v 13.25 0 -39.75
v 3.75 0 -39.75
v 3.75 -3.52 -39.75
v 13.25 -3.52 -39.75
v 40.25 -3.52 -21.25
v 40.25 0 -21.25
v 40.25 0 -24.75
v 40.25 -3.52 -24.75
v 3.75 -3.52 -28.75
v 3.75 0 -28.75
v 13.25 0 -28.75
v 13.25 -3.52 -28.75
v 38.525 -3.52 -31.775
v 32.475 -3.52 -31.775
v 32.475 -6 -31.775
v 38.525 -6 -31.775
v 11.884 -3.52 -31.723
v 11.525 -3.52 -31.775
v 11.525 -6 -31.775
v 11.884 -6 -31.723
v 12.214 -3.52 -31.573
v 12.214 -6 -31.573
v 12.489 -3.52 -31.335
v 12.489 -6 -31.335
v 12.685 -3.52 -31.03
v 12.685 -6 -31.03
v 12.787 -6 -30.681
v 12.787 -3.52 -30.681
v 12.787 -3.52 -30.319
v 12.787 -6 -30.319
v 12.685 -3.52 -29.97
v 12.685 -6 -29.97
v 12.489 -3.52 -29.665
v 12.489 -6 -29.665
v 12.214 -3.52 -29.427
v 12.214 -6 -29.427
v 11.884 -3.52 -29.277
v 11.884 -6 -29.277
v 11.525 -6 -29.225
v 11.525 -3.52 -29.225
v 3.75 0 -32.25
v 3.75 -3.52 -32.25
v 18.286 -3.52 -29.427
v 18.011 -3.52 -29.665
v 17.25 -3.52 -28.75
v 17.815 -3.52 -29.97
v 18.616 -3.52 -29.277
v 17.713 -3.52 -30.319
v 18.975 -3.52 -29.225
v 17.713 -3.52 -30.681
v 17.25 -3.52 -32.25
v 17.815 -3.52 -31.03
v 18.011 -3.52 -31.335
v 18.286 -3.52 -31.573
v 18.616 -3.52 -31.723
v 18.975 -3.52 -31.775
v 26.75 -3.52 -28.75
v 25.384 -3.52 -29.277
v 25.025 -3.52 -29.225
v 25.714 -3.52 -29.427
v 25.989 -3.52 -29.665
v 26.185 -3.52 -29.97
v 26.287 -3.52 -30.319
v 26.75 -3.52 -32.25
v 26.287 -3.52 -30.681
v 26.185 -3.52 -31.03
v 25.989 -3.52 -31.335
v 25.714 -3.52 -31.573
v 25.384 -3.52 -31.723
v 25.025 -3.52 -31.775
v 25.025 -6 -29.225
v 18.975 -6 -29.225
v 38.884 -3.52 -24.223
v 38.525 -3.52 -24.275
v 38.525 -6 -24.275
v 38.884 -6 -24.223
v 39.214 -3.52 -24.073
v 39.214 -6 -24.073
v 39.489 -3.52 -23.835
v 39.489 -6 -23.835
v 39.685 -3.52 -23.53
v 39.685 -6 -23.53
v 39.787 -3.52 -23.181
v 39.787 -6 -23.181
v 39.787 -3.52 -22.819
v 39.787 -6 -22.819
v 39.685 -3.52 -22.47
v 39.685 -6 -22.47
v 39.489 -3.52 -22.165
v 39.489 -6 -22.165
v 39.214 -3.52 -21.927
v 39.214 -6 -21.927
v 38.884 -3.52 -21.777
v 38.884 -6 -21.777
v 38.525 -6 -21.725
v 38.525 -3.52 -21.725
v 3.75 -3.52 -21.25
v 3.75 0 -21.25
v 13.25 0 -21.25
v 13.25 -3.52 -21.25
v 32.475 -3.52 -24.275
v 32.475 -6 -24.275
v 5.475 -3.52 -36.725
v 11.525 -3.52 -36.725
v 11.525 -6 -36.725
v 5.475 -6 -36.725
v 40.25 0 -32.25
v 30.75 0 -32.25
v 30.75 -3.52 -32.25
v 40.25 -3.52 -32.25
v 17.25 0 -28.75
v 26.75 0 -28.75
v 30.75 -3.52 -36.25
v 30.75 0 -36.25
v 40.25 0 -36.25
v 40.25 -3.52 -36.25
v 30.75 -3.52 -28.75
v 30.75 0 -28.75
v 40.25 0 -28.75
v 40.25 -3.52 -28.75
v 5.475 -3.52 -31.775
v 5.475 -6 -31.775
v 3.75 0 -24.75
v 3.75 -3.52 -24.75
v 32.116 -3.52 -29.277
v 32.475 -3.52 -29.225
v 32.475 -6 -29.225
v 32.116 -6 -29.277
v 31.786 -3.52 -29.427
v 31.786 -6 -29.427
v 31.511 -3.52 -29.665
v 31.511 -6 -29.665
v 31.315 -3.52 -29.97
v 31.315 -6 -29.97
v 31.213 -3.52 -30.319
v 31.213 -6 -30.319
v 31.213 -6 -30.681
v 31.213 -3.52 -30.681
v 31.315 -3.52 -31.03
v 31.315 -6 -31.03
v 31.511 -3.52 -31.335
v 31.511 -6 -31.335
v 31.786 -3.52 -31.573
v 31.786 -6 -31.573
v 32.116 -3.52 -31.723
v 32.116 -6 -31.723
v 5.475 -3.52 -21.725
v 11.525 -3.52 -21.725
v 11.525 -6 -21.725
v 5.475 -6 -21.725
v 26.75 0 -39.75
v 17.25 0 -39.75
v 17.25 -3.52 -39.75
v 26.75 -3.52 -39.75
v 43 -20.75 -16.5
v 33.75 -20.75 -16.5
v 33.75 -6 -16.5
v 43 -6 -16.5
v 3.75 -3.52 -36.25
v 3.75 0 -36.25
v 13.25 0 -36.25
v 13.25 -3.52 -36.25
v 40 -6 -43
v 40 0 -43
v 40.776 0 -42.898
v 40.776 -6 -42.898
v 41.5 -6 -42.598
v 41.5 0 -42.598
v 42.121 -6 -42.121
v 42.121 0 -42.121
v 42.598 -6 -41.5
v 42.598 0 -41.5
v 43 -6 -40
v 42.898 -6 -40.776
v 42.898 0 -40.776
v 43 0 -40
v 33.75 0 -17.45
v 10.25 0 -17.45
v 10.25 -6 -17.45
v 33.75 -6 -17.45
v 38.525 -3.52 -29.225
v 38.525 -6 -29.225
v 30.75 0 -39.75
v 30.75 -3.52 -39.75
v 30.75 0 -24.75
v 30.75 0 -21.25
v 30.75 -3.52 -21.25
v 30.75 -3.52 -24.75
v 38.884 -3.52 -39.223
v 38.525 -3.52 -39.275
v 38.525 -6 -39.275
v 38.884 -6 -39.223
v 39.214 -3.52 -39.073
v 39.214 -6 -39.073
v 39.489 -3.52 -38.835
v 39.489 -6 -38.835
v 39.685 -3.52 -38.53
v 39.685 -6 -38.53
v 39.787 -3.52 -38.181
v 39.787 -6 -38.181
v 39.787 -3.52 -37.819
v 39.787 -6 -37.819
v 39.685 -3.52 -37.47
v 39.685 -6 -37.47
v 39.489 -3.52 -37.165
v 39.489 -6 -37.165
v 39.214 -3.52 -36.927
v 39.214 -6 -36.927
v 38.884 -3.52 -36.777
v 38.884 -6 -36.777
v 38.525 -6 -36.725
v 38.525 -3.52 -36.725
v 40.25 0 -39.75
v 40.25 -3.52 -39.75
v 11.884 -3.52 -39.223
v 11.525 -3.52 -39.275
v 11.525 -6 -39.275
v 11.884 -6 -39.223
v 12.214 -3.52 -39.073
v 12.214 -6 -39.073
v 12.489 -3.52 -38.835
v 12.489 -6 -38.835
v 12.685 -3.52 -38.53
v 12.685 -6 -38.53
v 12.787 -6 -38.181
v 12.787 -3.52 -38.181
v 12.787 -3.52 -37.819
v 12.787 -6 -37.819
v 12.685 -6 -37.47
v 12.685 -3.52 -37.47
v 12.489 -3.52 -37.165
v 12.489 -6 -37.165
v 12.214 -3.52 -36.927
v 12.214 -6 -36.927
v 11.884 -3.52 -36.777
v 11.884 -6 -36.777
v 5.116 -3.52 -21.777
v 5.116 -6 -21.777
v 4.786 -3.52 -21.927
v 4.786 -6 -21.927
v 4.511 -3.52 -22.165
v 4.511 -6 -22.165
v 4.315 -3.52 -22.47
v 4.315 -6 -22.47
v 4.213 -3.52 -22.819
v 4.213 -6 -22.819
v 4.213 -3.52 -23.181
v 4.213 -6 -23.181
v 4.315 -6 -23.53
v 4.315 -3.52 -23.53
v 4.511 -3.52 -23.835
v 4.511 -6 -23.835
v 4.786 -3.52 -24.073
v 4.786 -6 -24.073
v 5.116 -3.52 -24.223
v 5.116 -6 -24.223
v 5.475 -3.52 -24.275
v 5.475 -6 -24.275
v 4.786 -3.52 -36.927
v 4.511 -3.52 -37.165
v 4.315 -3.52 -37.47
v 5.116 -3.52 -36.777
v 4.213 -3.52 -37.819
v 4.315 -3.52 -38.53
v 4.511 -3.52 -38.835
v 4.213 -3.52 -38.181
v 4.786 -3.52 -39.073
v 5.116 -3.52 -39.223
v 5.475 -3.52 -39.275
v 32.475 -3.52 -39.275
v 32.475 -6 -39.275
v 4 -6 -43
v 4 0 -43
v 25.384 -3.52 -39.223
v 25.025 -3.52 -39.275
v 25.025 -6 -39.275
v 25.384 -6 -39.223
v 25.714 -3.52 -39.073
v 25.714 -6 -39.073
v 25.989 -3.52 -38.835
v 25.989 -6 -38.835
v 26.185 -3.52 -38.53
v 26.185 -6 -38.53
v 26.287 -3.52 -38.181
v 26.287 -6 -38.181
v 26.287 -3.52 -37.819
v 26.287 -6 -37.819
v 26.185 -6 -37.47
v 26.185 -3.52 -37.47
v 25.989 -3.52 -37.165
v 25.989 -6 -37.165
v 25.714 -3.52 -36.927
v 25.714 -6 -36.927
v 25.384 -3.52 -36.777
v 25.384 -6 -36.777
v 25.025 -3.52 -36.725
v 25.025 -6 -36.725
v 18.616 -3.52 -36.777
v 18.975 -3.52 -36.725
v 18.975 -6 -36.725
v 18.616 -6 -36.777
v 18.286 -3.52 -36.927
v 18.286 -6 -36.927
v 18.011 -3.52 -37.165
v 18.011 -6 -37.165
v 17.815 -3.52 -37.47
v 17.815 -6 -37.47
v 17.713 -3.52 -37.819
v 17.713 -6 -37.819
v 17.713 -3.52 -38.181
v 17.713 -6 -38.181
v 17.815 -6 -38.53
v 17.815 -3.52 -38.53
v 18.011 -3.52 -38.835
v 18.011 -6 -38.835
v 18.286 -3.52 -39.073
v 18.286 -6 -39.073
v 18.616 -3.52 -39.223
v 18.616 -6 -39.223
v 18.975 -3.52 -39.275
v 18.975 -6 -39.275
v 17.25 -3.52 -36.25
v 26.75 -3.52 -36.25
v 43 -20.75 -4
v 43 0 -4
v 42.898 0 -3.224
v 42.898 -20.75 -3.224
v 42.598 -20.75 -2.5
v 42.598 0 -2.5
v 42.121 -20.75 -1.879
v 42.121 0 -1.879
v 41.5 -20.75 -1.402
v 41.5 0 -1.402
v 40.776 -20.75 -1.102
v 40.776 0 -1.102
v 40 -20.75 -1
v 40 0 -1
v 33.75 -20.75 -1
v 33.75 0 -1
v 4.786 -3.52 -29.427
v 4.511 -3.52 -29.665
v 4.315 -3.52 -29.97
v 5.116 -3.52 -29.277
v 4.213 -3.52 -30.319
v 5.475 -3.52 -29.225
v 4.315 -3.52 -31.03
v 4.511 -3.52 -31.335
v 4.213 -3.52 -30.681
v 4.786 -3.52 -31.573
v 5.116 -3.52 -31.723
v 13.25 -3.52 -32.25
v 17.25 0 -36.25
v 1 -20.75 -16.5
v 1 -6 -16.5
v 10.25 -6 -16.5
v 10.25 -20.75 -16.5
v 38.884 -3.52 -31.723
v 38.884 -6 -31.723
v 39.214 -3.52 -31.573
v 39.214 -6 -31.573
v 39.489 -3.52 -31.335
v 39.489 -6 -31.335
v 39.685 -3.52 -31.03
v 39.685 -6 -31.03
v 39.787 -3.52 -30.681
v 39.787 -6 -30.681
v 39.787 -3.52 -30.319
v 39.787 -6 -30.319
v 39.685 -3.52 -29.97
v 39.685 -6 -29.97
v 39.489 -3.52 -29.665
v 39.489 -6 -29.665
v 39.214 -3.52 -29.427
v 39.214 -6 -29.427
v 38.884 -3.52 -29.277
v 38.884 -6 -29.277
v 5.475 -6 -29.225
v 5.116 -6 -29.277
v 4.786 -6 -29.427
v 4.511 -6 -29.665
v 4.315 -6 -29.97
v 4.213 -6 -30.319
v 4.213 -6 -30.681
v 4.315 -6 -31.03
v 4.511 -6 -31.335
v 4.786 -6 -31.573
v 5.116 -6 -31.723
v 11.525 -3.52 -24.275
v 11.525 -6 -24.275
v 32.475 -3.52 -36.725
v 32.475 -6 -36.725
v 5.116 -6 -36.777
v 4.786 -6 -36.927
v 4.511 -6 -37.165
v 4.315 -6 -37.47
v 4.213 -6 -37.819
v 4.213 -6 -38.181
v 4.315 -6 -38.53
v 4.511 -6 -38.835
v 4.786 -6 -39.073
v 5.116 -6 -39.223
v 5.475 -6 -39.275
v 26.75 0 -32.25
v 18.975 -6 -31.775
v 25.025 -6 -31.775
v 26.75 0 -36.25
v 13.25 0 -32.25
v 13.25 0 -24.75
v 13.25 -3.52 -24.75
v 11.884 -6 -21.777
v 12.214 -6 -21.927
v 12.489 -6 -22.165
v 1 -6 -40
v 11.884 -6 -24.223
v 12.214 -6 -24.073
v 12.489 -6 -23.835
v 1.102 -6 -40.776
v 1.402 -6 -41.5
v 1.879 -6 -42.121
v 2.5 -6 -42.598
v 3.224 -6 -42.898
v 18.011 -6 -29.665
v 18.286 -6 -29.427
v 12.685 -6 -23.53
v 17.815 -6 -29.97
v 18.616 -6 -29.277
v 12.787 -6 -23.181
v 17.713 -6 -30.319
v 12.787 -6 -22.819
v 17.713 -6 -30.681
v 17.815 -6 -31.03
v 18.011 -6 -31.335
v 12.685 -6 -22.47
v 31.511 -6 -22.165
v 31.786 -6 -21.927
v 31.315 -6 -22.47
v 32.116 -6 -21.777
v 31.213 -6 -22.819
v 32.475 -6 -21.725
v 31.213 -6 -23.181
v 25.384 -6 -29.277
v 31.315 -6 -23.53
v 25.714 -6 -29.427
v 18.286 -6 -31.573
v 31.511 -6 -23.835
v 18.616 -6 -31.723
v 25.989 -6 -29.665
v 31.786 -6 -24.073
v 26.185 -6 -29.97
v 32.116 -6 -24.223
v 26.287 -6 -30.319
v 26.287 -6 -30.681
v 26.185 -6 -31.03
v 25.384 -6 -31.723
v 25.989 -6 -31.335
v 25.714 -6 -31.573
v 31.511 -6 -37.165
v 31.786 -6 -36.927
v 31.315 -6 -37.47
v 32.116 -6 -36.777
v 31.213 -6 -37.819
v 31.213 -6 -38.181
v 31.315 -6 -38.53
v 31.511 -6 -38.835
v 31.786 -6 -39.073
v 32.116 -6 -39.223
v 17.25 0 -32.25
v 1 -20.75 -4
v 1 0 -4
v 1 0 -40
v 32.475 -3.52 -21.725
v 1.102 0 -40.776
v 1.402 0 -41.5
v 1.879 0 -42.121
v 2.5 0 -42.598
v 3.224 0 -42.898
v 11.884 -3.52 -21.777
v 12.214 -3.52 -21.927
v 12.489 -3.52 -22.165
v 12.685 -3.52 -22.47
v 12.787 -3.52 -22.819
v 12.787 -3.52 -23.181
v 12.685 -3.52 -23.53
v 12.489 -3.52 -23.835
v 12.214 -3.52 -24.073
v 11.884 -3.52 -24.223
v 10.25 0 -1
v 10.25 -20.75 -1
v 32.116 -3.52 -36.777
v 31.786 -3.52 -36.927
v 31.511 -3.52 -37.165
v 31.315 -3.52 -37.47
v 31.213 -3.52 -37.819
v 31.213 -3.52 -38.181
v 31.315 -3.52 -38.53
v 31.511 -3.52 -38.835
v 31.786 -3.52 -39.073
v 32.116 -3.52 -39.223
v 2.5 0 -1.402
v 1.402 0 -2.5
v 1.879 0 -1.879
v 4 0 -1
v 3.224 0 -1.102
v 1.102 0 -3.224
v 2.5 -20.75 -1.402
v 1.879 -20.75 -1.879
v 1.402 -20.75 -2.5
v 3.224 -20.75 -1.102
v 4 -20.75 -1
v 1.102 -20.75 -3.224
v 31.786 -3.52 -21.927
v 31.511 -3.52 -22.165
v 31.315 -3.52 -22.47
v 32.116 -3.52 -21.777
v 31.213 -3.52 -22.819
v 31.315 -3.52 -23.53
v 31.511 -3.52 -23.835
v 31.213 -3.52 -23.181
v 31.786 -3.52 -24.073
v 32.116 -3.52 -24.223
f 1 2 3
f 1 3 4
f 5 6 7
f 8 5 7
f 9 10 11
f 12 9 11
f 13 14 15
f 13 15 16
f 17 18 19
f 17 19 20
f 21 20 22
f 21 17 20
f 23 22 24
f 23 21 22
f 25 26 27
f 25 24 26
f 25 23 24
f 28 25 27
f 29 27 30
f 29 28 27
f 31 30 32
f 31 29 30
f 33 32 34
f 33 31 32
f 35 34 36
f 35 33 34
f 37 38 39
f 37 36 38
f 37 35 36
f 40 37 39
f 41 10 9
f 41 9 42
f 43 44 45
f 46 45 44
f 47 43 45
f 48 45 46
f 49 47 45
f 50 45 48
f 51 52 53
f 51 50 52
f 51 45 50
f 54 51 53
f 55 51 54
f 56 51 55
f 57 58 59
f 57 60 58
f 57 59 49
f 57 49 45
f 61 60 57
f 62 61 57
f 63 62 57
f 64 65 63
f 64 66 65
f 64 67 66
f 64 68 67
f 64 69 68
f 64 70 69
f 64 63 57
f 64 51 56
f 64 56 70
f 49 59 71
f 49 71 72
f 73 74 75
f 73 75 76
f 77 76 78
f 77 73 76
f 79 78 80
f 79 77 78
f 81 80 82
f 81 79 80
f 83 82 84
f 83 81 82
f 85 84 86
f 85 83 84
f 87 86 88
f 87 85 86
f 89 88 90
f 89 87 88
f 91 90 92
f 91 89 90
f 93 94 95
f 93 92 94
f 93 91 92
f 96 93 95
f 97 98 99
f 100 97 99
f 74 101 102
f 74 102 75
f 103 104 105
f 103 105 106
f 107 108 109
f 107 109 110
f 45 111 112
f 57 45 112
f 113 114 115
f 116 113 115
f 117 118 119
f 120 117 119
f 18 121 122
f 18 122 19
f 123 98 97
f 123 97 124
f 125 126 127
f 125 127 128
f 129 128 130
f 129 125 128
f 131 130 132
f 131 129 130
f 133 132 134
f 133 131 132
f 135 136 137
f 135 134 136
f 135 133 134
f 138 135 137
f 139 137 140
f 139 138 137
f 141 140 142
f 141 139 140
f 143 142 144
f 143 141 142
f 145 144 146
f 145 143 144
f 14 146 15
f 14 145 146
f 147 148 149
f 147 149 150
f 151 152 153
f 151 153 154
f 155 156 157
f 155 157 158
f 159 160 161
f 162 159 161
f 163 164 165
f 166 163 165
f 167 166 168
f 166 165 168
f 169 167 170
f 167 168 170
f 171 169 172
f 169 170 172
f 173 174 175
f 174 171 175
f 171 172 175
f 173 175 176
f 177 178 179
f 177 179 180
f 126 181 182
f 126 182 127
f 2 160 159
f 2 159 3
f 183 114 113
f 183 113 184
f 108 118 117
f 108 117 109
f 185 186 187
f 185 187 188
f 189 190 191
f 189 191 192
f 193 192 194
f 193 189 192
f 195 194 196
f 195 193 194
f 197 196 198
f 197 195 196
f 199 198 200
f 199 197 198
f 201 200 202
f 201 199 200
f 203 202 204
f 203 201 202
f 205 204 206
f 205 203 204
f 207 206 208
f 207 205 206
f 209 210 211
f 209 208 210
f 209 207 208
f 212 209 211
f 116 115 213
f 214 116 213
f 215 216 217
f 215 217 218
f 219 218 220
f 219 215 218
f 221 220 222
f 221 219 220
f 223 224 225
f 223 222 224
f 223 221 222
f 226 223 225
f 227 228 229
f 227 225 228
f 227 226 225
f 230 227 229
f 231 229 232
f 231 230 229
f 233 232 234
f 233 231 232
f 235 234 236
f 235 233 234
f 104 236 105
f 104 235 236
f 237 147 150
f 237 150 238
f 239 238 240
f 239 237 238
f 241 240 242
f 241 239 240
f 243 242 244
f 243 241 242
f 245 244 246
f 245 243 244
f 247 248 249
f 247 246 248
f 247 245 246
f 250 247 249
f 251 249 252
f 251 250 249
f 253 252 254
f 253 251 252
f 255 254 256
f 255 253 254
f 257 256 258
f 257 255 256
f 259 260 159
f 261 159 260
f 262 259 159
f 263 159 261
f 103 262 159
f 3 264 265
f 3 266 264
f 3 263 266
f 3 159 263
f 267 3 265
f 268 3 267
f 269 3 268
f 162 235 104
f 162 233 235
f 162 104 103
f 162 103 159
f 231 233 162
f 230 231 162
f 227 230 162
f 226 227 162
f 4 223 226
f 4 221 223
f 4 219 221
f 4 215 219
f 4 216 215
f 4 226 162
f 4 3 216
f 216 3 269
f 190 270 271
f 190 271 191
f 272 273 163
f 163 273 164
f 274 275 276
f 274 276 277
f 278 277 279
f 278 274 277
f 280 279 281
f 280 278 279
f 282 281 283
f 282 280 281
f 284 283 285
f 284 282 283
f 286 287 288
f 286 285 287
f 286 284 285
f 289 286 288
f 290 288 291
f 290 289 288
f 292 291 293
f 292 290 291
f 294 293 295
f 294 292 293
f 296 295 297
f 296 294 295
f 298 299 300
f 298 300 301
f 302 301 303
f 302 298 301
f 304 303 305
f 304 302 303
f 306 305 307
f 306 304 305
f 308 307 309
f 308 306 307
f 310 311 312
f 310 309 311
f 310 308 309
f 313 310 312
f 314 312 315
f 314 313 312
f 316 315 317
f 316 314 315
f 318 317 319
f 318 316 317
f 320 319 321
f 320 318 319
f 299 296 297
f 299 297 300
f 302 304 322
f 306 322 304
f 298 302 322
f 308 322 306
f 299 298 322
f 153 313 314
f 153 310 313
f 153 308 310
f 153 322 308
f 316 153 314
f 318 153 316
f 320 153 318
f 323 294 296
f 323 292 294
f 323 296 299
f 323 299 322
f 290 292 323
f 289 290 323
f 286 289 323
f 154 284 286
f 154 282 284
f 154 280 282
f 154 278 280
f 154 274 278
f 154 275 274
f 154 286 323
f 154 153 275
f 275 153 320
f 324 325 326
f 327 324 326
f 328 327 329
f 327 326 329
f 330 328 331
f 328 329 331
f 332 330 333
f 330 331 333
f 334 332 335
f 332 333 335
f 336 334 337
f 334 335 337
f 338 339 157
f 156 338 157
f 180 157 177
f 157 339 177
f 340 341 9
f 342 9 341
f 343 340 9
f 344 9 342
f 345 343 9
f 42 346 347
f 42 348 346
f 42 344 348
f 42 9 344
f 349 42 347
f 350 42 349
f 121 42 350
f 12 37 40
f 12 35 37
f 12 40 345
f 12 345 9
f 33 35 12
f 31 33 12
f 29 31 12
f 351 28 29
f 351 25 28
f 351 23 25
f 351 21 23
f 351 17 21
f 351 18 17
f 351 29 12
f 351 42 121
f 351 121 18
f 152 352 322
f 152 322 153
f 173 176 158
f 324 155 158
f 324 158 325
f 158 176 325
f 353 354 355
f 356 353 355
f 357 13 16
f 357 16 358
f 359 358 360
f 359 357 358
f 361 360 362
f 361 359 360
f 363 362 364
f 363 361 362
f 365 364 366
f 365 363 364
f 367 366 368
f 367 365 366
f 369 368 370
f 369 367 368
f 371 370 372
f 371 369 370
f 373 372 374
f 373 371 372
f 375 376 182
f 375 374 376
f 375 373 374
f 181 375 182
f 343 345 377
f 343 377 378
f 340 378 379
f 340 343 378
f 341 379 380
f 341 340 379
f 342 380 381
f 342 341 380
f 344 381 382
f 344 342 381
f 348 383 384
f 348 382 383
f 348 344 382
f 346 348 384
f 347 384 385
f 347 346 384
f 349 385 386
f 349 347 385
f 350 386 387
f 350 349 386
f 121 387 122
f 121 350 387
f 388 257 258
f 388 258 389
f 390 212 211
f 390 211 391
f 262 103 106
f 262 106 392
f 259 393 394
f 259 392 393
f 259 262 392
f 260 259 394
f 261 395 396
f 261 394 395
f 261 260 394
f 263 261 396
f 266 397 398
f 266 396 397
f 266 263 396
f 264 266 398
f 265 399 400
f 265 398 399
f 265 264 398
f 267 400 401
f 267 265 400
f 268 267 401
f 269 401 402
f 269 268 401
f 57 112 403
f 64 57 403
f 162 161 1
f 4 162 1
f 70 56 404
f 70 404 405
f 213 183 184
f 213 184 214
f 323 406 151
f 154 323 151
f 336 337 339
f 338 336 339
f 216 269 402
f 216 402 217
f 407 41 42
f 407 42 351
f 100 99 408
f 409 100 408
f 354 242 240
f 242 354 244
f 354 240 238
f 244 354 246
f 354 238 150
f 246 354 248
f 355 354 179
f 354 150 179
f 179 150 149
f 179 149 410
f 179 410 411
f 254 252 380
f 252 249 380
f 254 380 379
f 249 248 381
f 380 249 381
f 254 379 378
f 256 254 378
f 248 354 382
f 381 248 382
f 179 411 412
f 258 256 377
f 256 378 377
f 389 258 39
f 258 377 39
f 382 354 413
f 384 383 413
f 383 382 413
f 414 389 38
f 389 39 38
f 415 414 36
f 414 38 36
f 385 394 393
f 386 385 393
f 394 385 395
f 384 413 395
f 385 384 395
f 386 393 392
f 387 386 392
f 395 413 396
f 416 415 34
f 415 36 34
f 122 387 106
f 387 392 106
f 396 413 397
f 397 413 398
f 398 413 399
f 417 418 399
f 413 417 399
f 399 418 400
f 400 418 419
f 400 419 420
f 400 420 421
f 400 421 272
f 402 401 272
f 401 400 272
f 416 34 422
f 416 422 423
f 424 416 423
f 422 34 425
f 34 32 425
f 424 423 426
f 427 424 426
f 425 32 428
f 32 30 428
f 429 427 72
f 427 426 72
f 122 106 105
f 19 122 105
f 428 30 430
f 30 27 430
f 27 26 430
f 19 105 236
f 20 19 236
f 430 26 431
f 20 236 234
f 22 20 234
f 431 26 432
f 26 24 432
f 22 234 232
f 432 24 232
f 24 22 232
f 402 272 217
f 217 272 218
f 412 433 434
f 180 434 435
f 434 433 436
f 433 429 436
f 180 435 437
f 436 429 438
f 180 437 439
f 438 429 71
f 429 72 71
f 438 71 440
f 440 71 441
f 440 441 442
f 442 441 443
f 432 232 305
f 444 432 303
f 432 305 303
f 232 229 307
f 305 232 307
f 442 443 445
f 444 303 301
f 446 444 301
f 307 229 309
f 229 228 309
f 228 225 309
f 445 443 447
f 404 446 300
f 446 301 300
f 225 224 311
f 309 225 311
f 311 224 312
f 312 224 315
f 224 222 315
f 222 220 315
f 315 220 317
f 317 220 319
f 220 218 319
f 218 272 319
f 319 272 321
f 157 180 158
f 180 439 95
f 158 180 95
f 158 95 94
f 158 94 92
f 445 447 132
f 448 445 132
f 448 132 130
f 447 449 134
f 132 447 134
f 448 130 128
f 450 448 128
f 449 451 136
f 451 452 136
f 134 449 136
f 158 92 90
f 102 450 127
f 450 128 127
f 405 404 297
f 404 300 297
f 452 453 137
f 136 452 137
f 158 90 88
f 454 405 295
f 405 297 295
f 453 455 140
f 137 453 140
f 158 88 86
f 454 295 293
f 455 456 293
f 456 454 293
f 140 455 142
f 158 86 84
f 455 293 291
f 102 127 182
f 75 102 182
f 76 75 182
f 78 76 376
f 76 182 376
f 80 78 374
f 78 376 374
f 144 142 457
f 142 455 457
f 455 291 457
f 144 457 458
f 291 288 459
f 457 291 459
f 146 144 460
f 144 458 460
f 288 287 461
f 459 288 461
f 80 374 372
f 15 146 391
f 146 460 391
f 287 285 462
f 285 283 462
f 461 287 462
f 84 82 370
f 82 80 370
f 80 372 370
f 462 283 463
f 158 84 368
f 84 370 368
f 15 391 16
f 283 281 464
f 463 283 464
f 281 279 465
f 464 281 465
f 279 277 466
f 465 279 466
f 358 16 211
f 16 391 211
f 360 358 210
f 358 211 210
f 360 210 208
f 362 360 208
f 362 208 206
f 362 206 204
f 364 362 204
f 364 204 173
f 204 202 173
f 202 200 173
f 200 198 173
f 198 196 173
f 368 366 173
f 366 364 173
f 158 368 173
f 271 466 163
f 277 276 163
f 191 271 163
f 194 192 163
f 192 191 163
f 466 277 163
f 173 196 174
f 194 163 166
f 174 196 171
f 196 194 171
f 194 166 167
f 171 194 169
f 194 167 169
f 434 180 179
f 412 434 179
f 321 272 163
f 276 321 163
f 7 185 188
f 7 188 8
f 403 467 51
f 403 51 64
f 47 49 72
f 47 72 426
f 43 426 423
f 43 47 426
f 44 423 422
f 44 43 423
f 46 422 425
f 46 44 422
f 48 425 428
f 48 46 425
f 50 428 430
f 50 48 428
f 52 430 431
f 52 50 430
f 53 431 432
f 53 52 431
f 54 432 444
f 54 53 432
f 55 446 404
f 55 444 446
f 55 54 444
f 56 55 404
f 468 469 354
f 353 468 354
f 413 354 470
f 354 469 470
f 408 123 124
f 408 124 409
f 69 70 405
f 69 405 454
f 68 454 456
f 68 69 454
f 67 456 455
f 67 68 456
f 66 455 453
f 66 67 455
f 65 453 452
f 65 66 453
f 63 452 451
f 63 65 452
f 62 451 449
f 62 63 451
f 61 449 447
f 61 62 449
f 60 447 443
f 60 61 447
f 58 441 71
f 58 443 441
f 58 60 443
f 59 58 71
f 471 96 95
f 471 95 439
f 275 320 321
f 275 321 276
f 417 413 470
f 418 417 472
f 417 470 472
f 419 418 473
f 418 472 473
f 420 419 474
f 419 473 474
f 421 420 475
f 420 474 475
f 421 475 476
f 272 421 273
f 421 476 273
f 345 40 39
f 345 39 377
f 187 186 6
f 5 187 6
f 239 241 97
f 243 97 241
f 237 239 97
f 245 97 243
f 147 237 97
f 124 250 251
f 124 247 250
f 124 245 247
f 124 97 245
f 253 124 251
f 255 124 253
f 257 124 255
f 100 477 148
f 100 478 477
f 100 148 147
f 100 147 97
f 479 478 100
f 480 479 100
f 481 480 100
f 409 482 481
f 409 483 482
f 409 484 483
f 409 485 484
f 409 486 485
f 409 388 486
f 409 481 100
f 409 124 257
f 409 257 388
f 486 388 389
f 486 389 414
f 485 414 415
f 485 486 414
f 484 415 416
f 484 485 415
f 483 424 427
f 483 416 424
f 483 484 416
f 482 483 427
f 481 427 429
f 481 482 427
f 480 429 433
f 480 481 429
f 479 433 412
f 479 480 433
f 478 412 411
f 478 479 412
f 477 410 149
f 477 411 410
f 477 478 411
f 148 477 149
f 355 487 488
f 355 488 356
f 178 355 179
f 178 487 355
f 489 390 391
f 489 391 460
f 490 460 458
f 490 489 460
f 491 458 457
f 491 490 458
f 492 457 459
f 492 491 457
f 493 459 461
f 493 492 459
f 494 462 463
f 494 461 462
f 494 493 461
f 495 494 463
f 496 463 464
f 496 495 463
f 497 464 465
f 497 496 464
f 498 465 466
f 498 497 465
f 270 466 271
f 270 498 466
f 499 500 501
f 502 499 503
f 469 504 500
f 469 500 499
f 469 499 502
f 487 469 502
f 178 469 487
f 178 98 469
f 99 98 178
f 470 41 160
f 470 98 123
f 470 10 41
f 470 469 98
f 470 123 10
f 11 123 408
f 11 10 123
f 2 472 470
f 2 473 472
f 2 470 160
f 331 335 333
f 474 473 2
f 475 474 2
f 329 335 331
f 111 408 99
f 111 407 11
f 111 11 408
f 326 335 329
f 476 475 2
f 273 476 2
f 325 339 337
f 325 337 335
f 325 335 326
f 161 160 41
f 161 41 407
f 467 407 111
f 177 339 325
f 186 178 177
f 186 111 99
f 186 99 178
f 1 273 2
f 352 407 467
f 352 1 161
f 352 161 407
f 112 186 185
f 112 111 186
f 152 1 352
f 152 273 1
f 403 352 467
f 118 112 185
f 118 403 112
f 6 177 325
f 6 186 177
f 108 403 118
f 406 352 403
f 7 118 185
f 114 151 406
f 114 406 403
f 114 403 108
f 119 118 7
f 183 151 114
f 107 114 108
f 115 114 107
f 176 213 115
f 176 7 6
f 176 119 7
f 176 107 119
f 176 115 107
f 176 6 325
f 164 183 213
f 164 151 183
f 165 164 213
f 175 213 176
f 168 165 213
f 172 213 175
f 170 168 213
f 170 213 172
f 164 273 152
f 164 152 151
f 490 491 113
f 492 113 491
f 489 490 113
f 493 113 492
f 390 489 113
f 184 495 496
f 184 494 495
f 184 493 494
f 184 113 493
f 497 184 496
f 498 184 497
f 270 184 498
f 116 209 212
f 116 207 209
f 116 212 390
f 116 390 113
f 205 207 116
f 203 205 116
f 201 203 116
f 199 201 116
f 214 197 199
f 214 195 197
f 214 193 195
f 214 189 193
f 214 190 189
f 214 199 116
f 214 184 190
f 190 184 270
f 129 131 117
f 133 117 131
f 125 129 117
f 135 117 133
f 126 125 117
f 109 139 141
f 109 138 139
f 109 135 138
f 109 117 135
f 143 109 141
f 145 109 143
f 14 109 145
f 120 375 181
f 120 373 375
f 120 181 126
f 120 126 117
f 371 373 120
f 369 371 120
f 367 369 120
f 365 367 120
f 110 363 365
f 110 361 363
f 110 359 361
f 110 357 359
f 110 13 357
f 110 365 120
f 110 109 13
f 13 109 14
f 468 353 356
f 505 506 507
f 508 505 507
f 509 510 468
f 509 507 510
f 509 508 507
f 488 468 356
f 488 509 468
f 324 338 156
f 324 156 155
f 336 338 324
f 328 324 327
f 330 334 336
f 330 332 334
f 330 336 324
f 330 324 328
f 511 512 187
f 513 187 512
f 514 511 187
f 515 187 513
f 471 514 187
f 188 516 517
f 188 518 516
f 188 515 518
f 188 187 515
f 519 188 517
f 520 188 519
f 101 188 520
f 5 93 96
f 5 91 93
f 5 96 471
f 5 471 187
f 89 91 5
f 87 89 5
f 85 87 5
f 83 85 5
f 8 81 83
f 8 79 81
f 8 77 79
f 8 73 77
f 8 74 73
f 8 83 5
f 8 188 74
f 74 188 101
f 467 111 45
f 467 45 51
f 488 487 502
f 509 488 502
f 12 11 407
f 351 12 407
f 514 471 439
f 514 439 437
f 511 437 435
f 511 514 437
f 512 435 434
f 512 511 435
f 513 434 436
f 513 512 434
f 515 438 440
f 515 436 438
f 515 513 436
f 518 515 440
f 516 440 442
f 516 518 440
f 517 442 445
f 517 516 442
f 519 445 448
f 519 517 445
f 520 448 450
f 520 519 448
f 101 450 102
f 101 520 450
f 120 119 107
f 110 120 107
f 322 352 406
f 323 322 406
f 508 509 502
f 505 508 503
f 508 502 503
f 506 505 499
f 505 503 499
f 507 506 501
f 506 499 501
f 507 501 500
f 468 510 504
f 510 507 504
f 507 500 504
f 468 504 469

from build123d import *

# Parameters (mm, degrees)
SKETCH1_W            = 44
SKETCH1_H            = 44
BOSS_EXTRUDE1_DEPTH  = 6
CUT_EXTRUDE1_DEPTH   = 7
SKETCH4_W            = 44
SKETCH4_H            = 16.5
BOSS_EXTRUDE2_DEPTH  = 14.75
SKETCH5_W            = 23.5
SKETCH5_H            = 17.45
CUT_EXTRUDE2_DEPTH   = 21.75
FILLET1_R            = 3
SKETCH6_W            = 9.5
SKETCH6_H            = 3.5
CUT_EXTRUDE3_DEPTH   = 3.52
LPATTERN1_COUNT      = 3
LPATTERN1_PITCH      = 13.5
LPATTERN1_COUNT_DIR2 = 3
LPATTERN1_PITCH_DIR2 = 7.5
CUT_EXTRUDE5_REACH   = 22.75


with BuildPart() as part:
    # Sketch1 → Boss-Extrude1 (new body)
    with BuildSketch(Plane(origin=(0, 0, 0), x_dir=(1, 0, 0), z_dir=(0, 1, 0))):
        with Locations((22, 22)):
            Rectangle(SKETCH1_W, SKETCH1_H)
    extrude(amount=-BOSS_EXTRUDE1_DEPTH)

    # Sketch2 → Cut-Extrude1 (cut, through all)
    with BuildSketch(Plane(origin=(0, 0, 0), x_dir=(1, 0, 0), z_dir=(0, 1, 0))):
        with BuildLine():
            Line((5.475, 39.275), (11.525, 39.275))
            ThreePointArc((11.525, 39.275), (12.8, 38), (11.525, 36.725))
            Line((11.525, 36.725), (5.475, 36.725))
            ThreePointArc((5.475, 36.725), (4.2, 38), (5.475, 39.275))
        make_face()
        with BuildLine():
            Line((18.975, 39.275), (25.025, 39.275))
            ThreePointArc((25.025, 39.275), (26.3, 38), (25.025, 36.725))
            Line((25.025, 36.725), (18.975, 36.725))
            ThreePointArc((18.975, 36.725), (17.7, 38), (18.975, 39.275))
        make_face()
        with BuildLine():
            Line((32.475, 39.275), (38.525, 39.275))
            ThreePointArc((38.525, 39.275), (39.8, 38), (38.525, 36.725))
            Line((38.525, 36.725), (32.475, 36.725))
            ThreePointArc((32.475, 36.725), (31.2, 38), (32.475, 39.275))
        make_face()
        with BuildLine():
            Line((18.975, 31.775), (25.025, 31.775))
            ThreePointArc((25.025, 31.775), (26.3, 30.5), (25.025, 29.225))
            Line((25.025, 29.225), (18.975, 29.225))
            ThreePointArc((18.975, 29.225), (17.7, 30.5), (18.975, 31.775))
        make_face()
        with BuildLine():
            Line((32.475, 31.775), (38.525, 31.775))
            ThreePointArc((38.525, 31.775), (39.8, 30.5), (38.525, 29.225))
            Line((38.525, 29.225), (32.475, 29.225))
            ThreePointArc((32.475, 29.225), (31.2, 30.5), (32.475, 31.775))
        make_face()
        with BuildLine():
            Line((32.475, 24.275), (38.525, 24.275))
            ThreePointArc((38.525, 24.275), (39.8, 23), (38.525, 21.725))
            Line((38.525, 21.725), (32.475, 21.725))
            ThreePointArc((32.475, 21.725), (31.2, 23), (32.475, 24.275))
        make_face()
        with BuildLine():
            Line((5.475, 31.775), (11.525, 31.775))
            ThreePointArc((11.525, 31.775), (12.8, 30.5), (11.525, 29.225))
            Line((11.525, 29.225), (5.475, 29.225))
            ThreePointArc((5.475, 29.225), (4.2, 30.5), (5.475, 31.775))
        make_face()
        with BuildLine():
            Line((5.475, 24.275), (11.525, 24.275))
            ThreePointArc((11.525, 24.275), (12.8, 23), (11.525, 21.725))
            Line((11.525, 21.725), (5.475, 21.725))
            ThreePointArc((5.475, 21.725), (4.2, 23), (5.475, 24.275))
        make_face()
    extrude(amount=-CUT_EXTRUDE1_DEPTH, mode=Mode.SUBTRACT)

    # Sketch4 → Boss-Extrude2 (add)
    with BuildSketch(Plane.XZ.offset(6)):
        with Locations((22, -8.25)):
            Rectangle(SKETCH4_W, SKETCH4_H)
    extrude(amount=BOSS_EXTRUDE2_DEPTH)

    # Sketch5 → Cut-Extrude2 (cut, through all)
    with BuildSketch(Plane(origin=(0, 0, 0), x_dir=(1, 0, 0), z_dir=(0, 1, 0))):
        with Locations((22, 8.725)):
            Rectangle(SKETCH5_W, SKETCH5_H)
    extrude(amount=-CUT_EXTRUDE2_DEPTH, mode=Mode.SUBTRACT)

    # Fillet1
    fillet1_edges = [part.edges().sort_by_distance(p)[0] for p in [
        (0, -10.375, 0),
        (44, -10.375, 0),
        (44, -3, -44),
        (0, -3, -44),
    ]]
    fillet(fillet1_edges, radius=FILLET1_R)

    # Sketch6 → Cut-Extrude3 (cut)
    with BuildSketch(Plane(origin=(0, 0, 0), x_dir=(1, 0, 0), z_dir=(0, 1, 0))):
        with Locations((8.5, 38)):
            Rectangle(SKETCH6_W, SKETCH6_H)
    cut_extrude3 = extrude(amount=-CUT_EXTRUDE3_DEPTH, mode=Mode.SUBTRACT)

    # LPattern1: Cut-Extrude3 3 × 3, 1 skipped
    with Locations(*[(i * LPATTERN1_PITCH, 0, j * LPATTERN1_PITCH_DIR2) for i in range(LPATTERN1_COUNT) for j in range(LPATTERN1_COUNT_DIR2) if (i, j) not in ((0, 0), (1, 2))]):
        add(cut_extrude3, mode=Mode.SUBTRACT)

    # Sketch7 → Cut-Extrude5 (cut, up to next)
    with BuildSketch(Plane(origin=(0, 0, 0), x_dir=(1, 0, 0), z_dir=(0, 1, 0)), mode=Mode.PRIVATE) as cut_extrude5_sk1:
        with BuildLine():
            Line((10.25, 0), (10.25, 1))
            Line((10.25, 1), (4, 1))
            ThreePointArc((4, 1), (1.878679656, 1.878679656), (1, 4))
            Line((1, 4), (1, 40))
            ThreePointArc((1, 40), (1.878679656, 42.121320344), (4, 43))
            Line((4, 43), (40, 43))
            ThreePointArc((40, 43), (42.121320344, 42.121320344), (43, 40))
            Line((43, 40), (43, 4))
            ThreePointArc((43, 4), (42.121320344, 1.878679656), (40, 1))
            Line((40, 1), (33.75, 1))
            Line((33.75, 1), (33.75, 0))
            Line((33.75, 0), (41, 0))
            ThreePointArc((41, 0), (43.121320344, 0.878679656), (44, 3))
            Line((44, 3), (44, 41))
            ThreePointArc((44, 41), (43.121320344, 43.121320344), (41, 44))
            Line((41, 44), (3, 44))
            ThreePointArc((3, 44), (0.878679656, 43.121320344), (0, 41))
            Line((0, 41), (0, 3))
            ThreePointArc((0, 3), (0.878679656, 0.878679656), (3, 0))
            Line((3, 0), (10.25, 0))
        make_face()
    cut_extrude5_tool1 = extrude(cut_extrude5_sk1.sketch, amount=-CUT_EXTRUDE5_REACH, mode=Mode.PRIVATE) & part.part
    add(cut_extrude5_tool1.solids().sort_by_distance((6.625, 0, -0.622254))[0], mode=Mode.SUBTRACT)


solid = part.part
